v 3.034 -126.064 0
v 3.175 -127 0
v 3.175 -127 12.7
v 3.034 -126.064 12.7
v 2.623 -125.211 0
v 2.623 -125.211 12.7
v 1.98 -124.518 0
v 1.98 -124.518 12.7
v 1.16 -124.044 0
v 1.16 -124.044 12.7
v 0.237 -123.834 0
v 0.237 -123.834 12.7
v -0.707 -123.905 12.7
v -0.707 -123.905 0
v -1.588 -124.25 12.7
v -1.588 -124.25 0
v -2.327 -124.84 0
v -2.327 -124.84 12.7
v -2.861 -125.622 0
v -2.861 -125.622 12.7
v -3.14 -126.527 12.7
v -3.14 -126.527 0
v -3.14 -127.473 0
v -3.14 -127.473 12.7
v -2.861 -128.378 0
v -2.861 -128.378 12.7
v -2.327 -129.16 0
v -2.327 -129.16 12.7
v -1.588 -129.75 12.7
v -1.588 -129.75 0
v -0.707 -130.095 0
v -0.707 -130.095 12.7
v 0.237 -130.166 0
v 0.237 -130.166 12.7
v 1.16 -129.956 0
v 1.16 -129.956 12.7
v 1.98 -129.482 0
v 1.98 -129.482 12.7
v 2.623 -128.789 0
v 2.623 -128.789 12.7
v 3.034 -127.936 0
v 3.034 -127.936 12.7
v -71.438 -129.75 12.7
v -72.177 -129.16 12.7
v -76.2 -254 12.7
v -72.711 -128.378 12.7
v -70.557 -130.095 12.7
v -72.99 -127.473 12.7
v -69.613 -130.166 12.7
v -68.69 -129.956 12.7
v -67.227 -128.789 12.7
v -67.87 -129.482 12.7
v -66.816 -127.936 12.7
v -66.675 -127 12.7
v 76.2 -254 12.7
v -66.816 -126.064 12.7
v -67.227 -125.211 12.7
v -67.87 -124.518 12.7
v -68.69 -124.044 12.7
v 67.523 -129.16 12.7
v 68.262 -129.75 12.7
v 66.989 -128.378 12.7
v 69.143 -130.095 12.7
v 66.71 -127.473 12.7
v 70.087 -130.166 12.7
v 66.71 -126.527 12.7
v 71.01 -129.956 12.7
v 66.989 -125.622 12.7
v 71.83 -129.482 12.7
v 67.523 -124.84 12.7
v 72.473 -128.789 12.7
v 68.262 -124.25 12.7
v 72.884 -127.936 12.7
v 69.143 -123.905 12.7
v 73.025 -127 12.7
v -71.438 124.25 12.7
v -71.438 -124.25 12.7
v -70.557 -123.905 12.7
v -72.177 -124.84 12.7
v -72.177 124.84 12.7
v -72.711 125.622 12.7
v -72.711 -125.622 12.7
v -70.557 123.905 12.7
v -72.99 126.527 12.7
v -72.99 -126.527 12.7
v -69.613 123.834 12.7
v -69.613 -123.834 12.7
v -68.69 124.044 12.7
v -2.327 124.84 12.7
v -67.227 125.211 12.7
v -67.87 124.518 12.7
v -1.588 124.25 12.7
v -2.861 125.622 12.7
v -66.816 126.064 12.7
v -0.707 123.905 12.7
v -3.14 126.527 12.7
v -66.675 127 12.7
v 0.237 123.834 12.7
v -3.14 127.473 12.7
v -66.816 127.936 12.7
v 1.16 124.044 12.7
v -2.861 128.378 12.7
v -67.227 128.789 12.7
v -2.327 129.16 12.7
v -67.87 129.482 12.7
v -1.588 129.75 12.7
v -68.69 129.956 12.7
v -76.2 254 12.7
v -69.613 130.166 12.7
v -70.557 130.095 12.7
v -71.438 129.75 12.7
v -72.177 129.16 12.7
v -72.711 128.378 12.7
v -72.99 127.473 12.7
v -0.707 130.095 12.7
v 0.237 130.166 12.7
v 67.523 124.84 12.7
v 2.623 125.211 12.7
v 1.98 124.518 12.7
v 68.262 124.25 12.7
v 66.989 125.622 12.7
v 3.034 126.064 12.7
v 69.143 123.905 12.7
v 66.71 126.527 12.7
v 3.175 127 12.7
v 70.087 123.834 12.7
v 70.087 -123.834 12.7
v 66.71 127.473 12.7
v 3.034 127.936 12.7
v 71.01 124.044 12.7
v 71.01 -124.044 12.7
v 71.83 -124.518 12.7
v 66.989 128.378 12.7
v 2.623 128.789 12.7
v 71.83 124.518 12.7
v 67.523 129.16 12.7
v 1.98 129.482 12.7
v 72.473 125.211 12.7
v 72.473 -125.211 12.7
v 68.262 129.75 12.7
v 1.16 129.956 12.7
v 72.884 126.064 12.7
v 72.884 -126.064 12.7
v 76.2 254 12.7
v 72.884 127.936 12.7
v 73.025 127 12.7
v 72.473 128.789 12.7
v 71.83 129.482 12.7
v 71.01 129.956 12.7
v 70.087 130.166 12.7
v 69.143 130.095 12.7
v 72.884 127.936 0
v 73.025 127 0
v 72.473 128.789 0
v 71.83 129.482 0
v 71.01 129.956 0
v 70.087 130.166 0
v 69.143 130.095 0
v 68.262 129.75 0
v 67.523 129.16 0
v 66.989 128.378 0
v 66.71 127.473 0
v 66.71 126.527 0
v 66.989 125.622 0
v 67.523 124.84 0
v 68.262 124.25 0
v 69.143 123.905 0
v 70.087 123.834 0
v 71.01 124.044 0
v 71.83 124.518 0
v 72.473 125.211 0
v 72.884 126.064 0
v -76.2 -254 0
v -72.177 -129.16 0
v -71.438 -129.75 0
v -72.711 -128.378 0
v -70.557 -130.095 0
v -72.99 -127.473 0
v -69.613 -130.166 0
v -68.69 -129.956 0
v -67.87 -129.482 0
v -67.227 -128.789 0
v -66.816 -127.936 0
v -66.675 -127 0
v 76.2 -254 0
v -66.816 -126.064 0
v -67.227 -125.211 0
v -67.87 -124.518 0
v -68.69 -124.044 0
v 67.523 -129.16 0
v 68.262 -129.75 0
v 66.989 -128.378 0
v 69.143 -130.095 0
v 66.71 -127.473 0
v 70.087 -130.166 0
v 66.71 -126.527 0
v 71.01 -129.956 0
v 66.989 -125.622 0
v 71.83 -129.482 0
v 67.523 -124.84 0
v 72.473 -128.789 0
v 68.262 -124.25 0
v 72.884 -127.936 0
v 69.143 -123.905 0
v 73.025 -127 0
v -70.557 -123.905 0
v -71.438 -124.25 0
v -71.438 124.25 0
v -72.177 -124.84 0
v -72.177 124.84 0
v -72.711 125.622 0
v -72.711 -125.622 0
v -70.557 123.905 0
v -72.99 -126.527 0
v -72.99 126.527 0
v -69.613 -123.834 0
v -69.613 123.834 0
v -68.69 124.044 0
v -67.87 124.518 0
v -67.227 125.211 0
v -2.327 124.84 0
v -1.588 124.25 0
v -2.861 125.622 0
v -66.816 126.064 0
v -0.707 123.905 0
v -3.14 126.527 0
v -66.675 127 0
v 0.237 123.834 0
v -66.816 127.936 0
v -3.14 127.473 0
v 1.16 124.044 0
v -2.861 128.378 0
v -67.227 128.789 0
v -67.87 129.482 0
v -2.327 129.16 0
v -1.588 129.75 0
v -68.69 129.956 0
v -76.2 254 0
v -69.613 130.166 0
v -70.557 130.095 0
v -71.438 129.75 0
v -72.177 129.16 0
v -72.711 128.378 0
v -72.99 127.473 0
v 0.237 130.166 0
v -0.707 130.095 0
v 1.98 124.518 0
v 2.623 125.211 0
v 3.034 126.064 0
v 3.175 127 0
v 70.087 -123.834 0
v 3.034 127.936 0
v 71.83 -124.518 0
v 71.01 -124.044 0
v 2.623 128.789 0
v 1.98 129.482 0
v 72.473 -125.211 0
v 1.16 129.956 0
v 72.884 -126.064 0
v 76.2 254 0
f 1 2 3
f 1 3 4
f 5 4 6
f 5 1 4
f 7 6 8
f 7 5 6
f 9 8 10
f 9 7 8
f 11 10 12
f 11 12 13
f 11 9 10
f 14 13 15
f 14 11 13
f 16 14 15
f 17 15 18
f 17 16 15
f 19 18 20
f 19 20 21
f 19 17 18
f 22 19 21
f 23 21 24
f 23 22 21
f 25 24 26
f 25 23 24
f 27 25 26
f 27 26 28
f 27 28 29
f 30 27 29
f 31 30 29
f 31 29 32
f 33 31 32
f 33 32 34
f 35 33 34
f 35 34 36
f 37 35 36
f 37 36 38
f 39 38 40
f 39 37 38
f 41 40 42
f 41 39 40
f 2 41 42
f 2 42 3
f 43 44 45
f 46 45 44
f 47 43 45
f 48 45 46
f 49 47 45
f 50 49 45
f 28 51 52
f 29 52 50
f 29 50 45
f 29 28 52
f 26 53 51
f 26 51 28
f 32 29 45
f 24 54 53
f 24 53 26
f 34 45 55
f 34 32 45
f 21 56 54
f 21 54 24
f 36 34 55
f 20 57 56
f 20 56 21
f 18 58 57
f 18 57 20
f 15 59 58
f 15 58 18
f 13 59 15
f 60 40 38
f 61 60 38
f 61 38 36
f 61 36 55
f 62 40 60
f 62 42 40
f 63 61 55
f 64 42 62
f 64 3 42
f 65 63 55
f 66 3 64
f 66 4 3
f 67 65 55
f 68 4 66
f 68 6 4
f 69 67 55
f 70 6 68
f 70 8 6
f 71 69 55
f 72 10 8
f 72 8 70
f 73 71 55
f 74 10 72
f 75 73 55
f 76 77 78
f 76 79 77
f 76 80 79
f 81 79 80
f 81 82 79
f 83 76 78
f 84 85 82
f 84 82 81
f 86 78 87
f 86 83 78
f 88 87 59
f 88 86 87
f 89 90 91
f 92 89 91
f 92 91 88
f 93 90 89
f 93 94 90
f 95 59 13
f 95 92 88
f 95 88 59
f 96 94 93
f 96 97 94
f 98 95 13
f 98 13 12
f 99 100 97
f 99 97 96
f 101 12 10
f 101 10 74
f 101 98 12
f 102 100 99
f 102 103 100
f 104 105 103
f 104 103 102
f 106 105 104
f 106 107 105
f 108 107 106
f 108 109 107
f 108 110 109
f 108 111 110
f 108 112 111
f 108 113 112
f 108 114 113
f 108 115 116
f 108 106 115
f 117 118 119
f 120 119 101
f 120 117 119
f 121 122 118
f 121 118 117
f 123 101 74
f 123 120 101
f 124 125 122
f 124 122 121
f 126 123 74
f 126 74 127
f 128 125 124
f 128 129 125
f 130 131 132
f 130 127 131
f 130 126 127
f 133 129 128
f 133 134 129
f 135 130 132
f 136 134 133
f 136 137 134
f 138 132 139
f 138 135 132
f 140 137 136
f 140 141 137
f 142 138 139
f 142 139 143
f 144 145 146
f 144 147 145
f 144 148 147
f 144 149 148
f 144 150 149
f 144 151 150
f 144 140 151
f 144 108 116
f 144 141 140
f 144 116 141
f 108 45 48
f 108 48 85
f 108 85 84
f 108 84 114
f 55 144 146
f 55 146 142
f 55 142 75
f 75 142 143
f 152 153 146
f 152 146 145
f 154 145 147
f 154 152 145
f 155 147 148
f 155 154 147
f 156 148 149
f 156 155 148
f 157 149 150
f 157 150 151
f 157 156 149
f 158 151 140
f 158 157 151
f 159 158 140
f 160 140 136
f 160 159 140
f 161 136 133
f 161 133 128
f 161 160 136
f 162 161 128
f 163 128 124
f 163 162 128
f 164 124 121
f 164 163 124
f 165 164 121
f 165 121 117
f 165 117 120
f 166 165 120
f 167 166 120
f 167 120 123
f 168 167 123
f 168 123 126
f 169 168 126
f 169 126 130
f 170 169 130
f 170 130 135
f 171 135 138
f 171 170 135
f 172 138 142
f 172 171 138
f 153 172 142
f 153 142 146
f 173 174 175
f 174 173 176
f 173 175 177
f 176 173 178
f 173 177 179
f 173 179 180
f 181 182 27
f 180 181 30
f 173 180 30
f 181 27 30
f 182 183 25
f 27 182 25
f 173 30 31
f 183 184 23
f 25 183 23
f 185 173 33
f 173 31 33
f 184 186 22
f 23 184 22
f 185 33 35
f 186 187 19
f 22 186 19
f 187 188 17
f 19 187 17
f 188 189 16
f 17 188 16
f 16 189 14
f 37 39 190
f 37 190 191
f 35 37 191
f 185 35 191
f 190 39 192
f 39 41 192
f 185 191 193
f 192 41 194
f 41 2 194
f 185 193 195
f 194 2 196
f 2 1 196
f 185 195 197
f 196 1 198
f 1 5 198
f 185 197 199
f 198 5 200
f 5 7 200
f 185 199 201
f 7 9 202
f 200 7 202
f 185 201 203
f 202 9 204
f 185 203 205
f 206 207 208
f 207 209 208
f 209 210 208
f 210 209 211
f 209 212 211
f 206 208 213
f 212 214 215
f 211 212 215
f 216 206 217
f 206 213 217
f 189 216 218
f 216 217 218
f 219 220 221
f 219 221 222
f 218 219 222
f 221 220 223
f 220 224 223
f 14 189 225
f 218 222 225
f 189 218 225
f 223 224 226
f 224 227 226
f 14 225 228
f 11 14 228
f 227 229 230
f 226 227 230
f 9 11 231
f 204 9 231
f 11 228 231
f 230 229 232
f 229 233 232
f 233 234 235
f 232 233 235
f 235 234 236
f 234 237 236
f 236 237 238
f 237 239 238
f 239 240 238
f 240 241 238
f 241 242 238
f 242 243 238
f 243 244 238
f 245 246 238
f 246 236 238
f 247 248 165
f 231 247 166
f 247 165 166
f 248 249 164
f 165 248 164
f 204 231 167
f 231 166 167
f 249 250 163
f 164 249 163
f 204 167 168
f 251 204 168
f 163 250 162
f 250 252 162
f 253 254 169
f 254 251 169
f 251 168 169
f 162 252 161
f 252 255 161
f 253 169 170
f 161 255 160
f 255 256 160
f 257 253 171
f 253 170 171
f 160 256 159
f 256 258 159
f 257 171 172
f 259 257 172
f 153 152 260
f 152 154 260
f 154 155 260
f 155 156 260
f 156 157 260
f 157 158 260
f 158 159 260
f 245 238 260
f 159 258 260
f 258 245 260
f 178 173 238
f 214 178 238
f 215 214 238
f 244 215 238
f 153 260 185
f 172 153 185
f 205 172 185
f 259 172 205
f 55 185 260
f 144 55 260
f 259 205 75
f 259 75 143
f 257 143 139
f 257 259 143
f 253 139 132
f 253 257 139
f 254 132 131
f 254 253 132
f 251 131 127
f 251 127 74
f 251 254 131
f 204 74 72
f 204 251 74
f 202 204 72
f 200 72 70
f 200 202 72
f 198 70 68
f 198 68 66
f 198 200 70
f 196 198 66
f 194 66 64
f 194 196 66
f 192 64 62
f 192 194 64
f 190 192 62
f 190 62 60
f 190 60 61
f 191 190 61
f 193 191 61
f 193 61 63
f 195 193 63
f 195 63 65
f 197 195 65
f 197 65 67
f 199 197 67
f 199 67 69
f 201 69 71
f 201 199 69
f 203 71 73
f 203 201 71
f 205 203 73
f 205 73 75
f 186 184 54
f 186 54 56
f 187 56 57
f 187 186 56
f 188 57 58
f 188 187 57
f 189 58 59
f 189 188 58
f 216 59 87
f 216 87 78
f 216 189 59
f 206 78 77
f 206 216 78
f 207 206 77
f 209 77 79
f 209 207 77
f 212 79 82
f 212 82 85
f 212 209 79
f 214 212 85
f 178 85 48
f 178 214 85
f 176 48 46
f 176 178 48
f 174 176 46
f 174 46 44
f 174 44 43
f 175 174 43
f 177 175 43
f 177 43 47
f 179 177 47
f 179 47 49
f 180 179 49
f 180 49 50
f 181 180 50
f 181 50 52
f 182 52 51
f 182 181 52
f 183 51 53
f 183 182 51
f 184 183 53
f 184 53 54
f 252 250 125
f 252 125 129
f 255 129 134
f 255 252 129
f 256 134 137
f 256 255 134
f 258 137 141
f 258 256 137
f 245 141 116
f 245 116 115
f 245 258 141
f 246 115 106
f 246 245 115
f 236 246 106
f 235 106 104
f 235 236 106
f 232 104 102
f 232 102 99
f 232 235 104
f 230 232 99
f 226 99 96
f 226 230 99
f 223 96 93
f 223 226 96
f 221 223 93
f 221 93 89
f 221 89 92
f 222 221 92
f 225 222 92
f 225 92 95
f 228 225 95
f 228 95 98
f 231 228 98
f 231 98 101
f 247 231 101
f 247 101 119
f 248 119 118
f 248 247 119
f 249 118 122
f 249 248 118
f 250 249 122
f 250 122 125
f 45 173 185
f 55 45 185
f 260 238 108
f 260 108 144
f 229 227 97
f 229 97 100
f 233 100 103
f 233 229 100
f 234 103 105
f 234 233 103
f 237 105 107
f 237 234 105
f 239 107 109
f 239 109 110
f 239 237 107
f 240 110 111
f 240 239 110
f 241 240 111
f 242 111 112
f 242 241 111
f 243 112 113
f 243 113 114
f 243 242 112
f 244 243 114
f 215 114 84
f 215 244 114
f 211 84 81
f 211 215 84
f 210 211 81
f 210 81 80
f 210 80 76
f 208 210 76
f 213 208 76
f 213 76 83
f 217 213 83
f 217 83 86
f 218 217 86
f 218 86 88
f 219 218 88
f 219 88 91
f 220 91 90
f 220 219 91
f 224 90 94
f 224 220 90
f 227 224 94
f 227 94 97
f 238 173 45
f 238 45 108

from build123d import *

# Parameters (mm, degrees)
F0_W     = 152.4
F0_H     = 508
F2_DEPTH = 12.7
F1_R     = 3.175
F3_DEPTH = 12.7


with BuildPart() as f2:
    # F0 (on Top) → F2 (new body)
    with BuildSketch(Plane.XY):
        Rectangle(F0_W, F0_H)
    extrude(amount=F2_DEPTH)

    # F1 (on Top) → F3 (cut, through all)
    with BuildSketch(Plane.XY):
        with Locations((-69.85, 127)):
            Circle(F1_R)
        with Locations((69.85, 127)):
            Circle(F1_R)
        with Locations((69.85, -127)):
            Circle(F1_R)
        with Locations((-69.85, -127)):
            Circle(F1_R)
        with Locations((0, 127)):
            Circle(F1_R)
        with Locations((0, -127)):
            Circle(F1_R)
    extrude(amount=F3_DEPTH, mode=Mode.SUBTRACT)


solid = f2.part
